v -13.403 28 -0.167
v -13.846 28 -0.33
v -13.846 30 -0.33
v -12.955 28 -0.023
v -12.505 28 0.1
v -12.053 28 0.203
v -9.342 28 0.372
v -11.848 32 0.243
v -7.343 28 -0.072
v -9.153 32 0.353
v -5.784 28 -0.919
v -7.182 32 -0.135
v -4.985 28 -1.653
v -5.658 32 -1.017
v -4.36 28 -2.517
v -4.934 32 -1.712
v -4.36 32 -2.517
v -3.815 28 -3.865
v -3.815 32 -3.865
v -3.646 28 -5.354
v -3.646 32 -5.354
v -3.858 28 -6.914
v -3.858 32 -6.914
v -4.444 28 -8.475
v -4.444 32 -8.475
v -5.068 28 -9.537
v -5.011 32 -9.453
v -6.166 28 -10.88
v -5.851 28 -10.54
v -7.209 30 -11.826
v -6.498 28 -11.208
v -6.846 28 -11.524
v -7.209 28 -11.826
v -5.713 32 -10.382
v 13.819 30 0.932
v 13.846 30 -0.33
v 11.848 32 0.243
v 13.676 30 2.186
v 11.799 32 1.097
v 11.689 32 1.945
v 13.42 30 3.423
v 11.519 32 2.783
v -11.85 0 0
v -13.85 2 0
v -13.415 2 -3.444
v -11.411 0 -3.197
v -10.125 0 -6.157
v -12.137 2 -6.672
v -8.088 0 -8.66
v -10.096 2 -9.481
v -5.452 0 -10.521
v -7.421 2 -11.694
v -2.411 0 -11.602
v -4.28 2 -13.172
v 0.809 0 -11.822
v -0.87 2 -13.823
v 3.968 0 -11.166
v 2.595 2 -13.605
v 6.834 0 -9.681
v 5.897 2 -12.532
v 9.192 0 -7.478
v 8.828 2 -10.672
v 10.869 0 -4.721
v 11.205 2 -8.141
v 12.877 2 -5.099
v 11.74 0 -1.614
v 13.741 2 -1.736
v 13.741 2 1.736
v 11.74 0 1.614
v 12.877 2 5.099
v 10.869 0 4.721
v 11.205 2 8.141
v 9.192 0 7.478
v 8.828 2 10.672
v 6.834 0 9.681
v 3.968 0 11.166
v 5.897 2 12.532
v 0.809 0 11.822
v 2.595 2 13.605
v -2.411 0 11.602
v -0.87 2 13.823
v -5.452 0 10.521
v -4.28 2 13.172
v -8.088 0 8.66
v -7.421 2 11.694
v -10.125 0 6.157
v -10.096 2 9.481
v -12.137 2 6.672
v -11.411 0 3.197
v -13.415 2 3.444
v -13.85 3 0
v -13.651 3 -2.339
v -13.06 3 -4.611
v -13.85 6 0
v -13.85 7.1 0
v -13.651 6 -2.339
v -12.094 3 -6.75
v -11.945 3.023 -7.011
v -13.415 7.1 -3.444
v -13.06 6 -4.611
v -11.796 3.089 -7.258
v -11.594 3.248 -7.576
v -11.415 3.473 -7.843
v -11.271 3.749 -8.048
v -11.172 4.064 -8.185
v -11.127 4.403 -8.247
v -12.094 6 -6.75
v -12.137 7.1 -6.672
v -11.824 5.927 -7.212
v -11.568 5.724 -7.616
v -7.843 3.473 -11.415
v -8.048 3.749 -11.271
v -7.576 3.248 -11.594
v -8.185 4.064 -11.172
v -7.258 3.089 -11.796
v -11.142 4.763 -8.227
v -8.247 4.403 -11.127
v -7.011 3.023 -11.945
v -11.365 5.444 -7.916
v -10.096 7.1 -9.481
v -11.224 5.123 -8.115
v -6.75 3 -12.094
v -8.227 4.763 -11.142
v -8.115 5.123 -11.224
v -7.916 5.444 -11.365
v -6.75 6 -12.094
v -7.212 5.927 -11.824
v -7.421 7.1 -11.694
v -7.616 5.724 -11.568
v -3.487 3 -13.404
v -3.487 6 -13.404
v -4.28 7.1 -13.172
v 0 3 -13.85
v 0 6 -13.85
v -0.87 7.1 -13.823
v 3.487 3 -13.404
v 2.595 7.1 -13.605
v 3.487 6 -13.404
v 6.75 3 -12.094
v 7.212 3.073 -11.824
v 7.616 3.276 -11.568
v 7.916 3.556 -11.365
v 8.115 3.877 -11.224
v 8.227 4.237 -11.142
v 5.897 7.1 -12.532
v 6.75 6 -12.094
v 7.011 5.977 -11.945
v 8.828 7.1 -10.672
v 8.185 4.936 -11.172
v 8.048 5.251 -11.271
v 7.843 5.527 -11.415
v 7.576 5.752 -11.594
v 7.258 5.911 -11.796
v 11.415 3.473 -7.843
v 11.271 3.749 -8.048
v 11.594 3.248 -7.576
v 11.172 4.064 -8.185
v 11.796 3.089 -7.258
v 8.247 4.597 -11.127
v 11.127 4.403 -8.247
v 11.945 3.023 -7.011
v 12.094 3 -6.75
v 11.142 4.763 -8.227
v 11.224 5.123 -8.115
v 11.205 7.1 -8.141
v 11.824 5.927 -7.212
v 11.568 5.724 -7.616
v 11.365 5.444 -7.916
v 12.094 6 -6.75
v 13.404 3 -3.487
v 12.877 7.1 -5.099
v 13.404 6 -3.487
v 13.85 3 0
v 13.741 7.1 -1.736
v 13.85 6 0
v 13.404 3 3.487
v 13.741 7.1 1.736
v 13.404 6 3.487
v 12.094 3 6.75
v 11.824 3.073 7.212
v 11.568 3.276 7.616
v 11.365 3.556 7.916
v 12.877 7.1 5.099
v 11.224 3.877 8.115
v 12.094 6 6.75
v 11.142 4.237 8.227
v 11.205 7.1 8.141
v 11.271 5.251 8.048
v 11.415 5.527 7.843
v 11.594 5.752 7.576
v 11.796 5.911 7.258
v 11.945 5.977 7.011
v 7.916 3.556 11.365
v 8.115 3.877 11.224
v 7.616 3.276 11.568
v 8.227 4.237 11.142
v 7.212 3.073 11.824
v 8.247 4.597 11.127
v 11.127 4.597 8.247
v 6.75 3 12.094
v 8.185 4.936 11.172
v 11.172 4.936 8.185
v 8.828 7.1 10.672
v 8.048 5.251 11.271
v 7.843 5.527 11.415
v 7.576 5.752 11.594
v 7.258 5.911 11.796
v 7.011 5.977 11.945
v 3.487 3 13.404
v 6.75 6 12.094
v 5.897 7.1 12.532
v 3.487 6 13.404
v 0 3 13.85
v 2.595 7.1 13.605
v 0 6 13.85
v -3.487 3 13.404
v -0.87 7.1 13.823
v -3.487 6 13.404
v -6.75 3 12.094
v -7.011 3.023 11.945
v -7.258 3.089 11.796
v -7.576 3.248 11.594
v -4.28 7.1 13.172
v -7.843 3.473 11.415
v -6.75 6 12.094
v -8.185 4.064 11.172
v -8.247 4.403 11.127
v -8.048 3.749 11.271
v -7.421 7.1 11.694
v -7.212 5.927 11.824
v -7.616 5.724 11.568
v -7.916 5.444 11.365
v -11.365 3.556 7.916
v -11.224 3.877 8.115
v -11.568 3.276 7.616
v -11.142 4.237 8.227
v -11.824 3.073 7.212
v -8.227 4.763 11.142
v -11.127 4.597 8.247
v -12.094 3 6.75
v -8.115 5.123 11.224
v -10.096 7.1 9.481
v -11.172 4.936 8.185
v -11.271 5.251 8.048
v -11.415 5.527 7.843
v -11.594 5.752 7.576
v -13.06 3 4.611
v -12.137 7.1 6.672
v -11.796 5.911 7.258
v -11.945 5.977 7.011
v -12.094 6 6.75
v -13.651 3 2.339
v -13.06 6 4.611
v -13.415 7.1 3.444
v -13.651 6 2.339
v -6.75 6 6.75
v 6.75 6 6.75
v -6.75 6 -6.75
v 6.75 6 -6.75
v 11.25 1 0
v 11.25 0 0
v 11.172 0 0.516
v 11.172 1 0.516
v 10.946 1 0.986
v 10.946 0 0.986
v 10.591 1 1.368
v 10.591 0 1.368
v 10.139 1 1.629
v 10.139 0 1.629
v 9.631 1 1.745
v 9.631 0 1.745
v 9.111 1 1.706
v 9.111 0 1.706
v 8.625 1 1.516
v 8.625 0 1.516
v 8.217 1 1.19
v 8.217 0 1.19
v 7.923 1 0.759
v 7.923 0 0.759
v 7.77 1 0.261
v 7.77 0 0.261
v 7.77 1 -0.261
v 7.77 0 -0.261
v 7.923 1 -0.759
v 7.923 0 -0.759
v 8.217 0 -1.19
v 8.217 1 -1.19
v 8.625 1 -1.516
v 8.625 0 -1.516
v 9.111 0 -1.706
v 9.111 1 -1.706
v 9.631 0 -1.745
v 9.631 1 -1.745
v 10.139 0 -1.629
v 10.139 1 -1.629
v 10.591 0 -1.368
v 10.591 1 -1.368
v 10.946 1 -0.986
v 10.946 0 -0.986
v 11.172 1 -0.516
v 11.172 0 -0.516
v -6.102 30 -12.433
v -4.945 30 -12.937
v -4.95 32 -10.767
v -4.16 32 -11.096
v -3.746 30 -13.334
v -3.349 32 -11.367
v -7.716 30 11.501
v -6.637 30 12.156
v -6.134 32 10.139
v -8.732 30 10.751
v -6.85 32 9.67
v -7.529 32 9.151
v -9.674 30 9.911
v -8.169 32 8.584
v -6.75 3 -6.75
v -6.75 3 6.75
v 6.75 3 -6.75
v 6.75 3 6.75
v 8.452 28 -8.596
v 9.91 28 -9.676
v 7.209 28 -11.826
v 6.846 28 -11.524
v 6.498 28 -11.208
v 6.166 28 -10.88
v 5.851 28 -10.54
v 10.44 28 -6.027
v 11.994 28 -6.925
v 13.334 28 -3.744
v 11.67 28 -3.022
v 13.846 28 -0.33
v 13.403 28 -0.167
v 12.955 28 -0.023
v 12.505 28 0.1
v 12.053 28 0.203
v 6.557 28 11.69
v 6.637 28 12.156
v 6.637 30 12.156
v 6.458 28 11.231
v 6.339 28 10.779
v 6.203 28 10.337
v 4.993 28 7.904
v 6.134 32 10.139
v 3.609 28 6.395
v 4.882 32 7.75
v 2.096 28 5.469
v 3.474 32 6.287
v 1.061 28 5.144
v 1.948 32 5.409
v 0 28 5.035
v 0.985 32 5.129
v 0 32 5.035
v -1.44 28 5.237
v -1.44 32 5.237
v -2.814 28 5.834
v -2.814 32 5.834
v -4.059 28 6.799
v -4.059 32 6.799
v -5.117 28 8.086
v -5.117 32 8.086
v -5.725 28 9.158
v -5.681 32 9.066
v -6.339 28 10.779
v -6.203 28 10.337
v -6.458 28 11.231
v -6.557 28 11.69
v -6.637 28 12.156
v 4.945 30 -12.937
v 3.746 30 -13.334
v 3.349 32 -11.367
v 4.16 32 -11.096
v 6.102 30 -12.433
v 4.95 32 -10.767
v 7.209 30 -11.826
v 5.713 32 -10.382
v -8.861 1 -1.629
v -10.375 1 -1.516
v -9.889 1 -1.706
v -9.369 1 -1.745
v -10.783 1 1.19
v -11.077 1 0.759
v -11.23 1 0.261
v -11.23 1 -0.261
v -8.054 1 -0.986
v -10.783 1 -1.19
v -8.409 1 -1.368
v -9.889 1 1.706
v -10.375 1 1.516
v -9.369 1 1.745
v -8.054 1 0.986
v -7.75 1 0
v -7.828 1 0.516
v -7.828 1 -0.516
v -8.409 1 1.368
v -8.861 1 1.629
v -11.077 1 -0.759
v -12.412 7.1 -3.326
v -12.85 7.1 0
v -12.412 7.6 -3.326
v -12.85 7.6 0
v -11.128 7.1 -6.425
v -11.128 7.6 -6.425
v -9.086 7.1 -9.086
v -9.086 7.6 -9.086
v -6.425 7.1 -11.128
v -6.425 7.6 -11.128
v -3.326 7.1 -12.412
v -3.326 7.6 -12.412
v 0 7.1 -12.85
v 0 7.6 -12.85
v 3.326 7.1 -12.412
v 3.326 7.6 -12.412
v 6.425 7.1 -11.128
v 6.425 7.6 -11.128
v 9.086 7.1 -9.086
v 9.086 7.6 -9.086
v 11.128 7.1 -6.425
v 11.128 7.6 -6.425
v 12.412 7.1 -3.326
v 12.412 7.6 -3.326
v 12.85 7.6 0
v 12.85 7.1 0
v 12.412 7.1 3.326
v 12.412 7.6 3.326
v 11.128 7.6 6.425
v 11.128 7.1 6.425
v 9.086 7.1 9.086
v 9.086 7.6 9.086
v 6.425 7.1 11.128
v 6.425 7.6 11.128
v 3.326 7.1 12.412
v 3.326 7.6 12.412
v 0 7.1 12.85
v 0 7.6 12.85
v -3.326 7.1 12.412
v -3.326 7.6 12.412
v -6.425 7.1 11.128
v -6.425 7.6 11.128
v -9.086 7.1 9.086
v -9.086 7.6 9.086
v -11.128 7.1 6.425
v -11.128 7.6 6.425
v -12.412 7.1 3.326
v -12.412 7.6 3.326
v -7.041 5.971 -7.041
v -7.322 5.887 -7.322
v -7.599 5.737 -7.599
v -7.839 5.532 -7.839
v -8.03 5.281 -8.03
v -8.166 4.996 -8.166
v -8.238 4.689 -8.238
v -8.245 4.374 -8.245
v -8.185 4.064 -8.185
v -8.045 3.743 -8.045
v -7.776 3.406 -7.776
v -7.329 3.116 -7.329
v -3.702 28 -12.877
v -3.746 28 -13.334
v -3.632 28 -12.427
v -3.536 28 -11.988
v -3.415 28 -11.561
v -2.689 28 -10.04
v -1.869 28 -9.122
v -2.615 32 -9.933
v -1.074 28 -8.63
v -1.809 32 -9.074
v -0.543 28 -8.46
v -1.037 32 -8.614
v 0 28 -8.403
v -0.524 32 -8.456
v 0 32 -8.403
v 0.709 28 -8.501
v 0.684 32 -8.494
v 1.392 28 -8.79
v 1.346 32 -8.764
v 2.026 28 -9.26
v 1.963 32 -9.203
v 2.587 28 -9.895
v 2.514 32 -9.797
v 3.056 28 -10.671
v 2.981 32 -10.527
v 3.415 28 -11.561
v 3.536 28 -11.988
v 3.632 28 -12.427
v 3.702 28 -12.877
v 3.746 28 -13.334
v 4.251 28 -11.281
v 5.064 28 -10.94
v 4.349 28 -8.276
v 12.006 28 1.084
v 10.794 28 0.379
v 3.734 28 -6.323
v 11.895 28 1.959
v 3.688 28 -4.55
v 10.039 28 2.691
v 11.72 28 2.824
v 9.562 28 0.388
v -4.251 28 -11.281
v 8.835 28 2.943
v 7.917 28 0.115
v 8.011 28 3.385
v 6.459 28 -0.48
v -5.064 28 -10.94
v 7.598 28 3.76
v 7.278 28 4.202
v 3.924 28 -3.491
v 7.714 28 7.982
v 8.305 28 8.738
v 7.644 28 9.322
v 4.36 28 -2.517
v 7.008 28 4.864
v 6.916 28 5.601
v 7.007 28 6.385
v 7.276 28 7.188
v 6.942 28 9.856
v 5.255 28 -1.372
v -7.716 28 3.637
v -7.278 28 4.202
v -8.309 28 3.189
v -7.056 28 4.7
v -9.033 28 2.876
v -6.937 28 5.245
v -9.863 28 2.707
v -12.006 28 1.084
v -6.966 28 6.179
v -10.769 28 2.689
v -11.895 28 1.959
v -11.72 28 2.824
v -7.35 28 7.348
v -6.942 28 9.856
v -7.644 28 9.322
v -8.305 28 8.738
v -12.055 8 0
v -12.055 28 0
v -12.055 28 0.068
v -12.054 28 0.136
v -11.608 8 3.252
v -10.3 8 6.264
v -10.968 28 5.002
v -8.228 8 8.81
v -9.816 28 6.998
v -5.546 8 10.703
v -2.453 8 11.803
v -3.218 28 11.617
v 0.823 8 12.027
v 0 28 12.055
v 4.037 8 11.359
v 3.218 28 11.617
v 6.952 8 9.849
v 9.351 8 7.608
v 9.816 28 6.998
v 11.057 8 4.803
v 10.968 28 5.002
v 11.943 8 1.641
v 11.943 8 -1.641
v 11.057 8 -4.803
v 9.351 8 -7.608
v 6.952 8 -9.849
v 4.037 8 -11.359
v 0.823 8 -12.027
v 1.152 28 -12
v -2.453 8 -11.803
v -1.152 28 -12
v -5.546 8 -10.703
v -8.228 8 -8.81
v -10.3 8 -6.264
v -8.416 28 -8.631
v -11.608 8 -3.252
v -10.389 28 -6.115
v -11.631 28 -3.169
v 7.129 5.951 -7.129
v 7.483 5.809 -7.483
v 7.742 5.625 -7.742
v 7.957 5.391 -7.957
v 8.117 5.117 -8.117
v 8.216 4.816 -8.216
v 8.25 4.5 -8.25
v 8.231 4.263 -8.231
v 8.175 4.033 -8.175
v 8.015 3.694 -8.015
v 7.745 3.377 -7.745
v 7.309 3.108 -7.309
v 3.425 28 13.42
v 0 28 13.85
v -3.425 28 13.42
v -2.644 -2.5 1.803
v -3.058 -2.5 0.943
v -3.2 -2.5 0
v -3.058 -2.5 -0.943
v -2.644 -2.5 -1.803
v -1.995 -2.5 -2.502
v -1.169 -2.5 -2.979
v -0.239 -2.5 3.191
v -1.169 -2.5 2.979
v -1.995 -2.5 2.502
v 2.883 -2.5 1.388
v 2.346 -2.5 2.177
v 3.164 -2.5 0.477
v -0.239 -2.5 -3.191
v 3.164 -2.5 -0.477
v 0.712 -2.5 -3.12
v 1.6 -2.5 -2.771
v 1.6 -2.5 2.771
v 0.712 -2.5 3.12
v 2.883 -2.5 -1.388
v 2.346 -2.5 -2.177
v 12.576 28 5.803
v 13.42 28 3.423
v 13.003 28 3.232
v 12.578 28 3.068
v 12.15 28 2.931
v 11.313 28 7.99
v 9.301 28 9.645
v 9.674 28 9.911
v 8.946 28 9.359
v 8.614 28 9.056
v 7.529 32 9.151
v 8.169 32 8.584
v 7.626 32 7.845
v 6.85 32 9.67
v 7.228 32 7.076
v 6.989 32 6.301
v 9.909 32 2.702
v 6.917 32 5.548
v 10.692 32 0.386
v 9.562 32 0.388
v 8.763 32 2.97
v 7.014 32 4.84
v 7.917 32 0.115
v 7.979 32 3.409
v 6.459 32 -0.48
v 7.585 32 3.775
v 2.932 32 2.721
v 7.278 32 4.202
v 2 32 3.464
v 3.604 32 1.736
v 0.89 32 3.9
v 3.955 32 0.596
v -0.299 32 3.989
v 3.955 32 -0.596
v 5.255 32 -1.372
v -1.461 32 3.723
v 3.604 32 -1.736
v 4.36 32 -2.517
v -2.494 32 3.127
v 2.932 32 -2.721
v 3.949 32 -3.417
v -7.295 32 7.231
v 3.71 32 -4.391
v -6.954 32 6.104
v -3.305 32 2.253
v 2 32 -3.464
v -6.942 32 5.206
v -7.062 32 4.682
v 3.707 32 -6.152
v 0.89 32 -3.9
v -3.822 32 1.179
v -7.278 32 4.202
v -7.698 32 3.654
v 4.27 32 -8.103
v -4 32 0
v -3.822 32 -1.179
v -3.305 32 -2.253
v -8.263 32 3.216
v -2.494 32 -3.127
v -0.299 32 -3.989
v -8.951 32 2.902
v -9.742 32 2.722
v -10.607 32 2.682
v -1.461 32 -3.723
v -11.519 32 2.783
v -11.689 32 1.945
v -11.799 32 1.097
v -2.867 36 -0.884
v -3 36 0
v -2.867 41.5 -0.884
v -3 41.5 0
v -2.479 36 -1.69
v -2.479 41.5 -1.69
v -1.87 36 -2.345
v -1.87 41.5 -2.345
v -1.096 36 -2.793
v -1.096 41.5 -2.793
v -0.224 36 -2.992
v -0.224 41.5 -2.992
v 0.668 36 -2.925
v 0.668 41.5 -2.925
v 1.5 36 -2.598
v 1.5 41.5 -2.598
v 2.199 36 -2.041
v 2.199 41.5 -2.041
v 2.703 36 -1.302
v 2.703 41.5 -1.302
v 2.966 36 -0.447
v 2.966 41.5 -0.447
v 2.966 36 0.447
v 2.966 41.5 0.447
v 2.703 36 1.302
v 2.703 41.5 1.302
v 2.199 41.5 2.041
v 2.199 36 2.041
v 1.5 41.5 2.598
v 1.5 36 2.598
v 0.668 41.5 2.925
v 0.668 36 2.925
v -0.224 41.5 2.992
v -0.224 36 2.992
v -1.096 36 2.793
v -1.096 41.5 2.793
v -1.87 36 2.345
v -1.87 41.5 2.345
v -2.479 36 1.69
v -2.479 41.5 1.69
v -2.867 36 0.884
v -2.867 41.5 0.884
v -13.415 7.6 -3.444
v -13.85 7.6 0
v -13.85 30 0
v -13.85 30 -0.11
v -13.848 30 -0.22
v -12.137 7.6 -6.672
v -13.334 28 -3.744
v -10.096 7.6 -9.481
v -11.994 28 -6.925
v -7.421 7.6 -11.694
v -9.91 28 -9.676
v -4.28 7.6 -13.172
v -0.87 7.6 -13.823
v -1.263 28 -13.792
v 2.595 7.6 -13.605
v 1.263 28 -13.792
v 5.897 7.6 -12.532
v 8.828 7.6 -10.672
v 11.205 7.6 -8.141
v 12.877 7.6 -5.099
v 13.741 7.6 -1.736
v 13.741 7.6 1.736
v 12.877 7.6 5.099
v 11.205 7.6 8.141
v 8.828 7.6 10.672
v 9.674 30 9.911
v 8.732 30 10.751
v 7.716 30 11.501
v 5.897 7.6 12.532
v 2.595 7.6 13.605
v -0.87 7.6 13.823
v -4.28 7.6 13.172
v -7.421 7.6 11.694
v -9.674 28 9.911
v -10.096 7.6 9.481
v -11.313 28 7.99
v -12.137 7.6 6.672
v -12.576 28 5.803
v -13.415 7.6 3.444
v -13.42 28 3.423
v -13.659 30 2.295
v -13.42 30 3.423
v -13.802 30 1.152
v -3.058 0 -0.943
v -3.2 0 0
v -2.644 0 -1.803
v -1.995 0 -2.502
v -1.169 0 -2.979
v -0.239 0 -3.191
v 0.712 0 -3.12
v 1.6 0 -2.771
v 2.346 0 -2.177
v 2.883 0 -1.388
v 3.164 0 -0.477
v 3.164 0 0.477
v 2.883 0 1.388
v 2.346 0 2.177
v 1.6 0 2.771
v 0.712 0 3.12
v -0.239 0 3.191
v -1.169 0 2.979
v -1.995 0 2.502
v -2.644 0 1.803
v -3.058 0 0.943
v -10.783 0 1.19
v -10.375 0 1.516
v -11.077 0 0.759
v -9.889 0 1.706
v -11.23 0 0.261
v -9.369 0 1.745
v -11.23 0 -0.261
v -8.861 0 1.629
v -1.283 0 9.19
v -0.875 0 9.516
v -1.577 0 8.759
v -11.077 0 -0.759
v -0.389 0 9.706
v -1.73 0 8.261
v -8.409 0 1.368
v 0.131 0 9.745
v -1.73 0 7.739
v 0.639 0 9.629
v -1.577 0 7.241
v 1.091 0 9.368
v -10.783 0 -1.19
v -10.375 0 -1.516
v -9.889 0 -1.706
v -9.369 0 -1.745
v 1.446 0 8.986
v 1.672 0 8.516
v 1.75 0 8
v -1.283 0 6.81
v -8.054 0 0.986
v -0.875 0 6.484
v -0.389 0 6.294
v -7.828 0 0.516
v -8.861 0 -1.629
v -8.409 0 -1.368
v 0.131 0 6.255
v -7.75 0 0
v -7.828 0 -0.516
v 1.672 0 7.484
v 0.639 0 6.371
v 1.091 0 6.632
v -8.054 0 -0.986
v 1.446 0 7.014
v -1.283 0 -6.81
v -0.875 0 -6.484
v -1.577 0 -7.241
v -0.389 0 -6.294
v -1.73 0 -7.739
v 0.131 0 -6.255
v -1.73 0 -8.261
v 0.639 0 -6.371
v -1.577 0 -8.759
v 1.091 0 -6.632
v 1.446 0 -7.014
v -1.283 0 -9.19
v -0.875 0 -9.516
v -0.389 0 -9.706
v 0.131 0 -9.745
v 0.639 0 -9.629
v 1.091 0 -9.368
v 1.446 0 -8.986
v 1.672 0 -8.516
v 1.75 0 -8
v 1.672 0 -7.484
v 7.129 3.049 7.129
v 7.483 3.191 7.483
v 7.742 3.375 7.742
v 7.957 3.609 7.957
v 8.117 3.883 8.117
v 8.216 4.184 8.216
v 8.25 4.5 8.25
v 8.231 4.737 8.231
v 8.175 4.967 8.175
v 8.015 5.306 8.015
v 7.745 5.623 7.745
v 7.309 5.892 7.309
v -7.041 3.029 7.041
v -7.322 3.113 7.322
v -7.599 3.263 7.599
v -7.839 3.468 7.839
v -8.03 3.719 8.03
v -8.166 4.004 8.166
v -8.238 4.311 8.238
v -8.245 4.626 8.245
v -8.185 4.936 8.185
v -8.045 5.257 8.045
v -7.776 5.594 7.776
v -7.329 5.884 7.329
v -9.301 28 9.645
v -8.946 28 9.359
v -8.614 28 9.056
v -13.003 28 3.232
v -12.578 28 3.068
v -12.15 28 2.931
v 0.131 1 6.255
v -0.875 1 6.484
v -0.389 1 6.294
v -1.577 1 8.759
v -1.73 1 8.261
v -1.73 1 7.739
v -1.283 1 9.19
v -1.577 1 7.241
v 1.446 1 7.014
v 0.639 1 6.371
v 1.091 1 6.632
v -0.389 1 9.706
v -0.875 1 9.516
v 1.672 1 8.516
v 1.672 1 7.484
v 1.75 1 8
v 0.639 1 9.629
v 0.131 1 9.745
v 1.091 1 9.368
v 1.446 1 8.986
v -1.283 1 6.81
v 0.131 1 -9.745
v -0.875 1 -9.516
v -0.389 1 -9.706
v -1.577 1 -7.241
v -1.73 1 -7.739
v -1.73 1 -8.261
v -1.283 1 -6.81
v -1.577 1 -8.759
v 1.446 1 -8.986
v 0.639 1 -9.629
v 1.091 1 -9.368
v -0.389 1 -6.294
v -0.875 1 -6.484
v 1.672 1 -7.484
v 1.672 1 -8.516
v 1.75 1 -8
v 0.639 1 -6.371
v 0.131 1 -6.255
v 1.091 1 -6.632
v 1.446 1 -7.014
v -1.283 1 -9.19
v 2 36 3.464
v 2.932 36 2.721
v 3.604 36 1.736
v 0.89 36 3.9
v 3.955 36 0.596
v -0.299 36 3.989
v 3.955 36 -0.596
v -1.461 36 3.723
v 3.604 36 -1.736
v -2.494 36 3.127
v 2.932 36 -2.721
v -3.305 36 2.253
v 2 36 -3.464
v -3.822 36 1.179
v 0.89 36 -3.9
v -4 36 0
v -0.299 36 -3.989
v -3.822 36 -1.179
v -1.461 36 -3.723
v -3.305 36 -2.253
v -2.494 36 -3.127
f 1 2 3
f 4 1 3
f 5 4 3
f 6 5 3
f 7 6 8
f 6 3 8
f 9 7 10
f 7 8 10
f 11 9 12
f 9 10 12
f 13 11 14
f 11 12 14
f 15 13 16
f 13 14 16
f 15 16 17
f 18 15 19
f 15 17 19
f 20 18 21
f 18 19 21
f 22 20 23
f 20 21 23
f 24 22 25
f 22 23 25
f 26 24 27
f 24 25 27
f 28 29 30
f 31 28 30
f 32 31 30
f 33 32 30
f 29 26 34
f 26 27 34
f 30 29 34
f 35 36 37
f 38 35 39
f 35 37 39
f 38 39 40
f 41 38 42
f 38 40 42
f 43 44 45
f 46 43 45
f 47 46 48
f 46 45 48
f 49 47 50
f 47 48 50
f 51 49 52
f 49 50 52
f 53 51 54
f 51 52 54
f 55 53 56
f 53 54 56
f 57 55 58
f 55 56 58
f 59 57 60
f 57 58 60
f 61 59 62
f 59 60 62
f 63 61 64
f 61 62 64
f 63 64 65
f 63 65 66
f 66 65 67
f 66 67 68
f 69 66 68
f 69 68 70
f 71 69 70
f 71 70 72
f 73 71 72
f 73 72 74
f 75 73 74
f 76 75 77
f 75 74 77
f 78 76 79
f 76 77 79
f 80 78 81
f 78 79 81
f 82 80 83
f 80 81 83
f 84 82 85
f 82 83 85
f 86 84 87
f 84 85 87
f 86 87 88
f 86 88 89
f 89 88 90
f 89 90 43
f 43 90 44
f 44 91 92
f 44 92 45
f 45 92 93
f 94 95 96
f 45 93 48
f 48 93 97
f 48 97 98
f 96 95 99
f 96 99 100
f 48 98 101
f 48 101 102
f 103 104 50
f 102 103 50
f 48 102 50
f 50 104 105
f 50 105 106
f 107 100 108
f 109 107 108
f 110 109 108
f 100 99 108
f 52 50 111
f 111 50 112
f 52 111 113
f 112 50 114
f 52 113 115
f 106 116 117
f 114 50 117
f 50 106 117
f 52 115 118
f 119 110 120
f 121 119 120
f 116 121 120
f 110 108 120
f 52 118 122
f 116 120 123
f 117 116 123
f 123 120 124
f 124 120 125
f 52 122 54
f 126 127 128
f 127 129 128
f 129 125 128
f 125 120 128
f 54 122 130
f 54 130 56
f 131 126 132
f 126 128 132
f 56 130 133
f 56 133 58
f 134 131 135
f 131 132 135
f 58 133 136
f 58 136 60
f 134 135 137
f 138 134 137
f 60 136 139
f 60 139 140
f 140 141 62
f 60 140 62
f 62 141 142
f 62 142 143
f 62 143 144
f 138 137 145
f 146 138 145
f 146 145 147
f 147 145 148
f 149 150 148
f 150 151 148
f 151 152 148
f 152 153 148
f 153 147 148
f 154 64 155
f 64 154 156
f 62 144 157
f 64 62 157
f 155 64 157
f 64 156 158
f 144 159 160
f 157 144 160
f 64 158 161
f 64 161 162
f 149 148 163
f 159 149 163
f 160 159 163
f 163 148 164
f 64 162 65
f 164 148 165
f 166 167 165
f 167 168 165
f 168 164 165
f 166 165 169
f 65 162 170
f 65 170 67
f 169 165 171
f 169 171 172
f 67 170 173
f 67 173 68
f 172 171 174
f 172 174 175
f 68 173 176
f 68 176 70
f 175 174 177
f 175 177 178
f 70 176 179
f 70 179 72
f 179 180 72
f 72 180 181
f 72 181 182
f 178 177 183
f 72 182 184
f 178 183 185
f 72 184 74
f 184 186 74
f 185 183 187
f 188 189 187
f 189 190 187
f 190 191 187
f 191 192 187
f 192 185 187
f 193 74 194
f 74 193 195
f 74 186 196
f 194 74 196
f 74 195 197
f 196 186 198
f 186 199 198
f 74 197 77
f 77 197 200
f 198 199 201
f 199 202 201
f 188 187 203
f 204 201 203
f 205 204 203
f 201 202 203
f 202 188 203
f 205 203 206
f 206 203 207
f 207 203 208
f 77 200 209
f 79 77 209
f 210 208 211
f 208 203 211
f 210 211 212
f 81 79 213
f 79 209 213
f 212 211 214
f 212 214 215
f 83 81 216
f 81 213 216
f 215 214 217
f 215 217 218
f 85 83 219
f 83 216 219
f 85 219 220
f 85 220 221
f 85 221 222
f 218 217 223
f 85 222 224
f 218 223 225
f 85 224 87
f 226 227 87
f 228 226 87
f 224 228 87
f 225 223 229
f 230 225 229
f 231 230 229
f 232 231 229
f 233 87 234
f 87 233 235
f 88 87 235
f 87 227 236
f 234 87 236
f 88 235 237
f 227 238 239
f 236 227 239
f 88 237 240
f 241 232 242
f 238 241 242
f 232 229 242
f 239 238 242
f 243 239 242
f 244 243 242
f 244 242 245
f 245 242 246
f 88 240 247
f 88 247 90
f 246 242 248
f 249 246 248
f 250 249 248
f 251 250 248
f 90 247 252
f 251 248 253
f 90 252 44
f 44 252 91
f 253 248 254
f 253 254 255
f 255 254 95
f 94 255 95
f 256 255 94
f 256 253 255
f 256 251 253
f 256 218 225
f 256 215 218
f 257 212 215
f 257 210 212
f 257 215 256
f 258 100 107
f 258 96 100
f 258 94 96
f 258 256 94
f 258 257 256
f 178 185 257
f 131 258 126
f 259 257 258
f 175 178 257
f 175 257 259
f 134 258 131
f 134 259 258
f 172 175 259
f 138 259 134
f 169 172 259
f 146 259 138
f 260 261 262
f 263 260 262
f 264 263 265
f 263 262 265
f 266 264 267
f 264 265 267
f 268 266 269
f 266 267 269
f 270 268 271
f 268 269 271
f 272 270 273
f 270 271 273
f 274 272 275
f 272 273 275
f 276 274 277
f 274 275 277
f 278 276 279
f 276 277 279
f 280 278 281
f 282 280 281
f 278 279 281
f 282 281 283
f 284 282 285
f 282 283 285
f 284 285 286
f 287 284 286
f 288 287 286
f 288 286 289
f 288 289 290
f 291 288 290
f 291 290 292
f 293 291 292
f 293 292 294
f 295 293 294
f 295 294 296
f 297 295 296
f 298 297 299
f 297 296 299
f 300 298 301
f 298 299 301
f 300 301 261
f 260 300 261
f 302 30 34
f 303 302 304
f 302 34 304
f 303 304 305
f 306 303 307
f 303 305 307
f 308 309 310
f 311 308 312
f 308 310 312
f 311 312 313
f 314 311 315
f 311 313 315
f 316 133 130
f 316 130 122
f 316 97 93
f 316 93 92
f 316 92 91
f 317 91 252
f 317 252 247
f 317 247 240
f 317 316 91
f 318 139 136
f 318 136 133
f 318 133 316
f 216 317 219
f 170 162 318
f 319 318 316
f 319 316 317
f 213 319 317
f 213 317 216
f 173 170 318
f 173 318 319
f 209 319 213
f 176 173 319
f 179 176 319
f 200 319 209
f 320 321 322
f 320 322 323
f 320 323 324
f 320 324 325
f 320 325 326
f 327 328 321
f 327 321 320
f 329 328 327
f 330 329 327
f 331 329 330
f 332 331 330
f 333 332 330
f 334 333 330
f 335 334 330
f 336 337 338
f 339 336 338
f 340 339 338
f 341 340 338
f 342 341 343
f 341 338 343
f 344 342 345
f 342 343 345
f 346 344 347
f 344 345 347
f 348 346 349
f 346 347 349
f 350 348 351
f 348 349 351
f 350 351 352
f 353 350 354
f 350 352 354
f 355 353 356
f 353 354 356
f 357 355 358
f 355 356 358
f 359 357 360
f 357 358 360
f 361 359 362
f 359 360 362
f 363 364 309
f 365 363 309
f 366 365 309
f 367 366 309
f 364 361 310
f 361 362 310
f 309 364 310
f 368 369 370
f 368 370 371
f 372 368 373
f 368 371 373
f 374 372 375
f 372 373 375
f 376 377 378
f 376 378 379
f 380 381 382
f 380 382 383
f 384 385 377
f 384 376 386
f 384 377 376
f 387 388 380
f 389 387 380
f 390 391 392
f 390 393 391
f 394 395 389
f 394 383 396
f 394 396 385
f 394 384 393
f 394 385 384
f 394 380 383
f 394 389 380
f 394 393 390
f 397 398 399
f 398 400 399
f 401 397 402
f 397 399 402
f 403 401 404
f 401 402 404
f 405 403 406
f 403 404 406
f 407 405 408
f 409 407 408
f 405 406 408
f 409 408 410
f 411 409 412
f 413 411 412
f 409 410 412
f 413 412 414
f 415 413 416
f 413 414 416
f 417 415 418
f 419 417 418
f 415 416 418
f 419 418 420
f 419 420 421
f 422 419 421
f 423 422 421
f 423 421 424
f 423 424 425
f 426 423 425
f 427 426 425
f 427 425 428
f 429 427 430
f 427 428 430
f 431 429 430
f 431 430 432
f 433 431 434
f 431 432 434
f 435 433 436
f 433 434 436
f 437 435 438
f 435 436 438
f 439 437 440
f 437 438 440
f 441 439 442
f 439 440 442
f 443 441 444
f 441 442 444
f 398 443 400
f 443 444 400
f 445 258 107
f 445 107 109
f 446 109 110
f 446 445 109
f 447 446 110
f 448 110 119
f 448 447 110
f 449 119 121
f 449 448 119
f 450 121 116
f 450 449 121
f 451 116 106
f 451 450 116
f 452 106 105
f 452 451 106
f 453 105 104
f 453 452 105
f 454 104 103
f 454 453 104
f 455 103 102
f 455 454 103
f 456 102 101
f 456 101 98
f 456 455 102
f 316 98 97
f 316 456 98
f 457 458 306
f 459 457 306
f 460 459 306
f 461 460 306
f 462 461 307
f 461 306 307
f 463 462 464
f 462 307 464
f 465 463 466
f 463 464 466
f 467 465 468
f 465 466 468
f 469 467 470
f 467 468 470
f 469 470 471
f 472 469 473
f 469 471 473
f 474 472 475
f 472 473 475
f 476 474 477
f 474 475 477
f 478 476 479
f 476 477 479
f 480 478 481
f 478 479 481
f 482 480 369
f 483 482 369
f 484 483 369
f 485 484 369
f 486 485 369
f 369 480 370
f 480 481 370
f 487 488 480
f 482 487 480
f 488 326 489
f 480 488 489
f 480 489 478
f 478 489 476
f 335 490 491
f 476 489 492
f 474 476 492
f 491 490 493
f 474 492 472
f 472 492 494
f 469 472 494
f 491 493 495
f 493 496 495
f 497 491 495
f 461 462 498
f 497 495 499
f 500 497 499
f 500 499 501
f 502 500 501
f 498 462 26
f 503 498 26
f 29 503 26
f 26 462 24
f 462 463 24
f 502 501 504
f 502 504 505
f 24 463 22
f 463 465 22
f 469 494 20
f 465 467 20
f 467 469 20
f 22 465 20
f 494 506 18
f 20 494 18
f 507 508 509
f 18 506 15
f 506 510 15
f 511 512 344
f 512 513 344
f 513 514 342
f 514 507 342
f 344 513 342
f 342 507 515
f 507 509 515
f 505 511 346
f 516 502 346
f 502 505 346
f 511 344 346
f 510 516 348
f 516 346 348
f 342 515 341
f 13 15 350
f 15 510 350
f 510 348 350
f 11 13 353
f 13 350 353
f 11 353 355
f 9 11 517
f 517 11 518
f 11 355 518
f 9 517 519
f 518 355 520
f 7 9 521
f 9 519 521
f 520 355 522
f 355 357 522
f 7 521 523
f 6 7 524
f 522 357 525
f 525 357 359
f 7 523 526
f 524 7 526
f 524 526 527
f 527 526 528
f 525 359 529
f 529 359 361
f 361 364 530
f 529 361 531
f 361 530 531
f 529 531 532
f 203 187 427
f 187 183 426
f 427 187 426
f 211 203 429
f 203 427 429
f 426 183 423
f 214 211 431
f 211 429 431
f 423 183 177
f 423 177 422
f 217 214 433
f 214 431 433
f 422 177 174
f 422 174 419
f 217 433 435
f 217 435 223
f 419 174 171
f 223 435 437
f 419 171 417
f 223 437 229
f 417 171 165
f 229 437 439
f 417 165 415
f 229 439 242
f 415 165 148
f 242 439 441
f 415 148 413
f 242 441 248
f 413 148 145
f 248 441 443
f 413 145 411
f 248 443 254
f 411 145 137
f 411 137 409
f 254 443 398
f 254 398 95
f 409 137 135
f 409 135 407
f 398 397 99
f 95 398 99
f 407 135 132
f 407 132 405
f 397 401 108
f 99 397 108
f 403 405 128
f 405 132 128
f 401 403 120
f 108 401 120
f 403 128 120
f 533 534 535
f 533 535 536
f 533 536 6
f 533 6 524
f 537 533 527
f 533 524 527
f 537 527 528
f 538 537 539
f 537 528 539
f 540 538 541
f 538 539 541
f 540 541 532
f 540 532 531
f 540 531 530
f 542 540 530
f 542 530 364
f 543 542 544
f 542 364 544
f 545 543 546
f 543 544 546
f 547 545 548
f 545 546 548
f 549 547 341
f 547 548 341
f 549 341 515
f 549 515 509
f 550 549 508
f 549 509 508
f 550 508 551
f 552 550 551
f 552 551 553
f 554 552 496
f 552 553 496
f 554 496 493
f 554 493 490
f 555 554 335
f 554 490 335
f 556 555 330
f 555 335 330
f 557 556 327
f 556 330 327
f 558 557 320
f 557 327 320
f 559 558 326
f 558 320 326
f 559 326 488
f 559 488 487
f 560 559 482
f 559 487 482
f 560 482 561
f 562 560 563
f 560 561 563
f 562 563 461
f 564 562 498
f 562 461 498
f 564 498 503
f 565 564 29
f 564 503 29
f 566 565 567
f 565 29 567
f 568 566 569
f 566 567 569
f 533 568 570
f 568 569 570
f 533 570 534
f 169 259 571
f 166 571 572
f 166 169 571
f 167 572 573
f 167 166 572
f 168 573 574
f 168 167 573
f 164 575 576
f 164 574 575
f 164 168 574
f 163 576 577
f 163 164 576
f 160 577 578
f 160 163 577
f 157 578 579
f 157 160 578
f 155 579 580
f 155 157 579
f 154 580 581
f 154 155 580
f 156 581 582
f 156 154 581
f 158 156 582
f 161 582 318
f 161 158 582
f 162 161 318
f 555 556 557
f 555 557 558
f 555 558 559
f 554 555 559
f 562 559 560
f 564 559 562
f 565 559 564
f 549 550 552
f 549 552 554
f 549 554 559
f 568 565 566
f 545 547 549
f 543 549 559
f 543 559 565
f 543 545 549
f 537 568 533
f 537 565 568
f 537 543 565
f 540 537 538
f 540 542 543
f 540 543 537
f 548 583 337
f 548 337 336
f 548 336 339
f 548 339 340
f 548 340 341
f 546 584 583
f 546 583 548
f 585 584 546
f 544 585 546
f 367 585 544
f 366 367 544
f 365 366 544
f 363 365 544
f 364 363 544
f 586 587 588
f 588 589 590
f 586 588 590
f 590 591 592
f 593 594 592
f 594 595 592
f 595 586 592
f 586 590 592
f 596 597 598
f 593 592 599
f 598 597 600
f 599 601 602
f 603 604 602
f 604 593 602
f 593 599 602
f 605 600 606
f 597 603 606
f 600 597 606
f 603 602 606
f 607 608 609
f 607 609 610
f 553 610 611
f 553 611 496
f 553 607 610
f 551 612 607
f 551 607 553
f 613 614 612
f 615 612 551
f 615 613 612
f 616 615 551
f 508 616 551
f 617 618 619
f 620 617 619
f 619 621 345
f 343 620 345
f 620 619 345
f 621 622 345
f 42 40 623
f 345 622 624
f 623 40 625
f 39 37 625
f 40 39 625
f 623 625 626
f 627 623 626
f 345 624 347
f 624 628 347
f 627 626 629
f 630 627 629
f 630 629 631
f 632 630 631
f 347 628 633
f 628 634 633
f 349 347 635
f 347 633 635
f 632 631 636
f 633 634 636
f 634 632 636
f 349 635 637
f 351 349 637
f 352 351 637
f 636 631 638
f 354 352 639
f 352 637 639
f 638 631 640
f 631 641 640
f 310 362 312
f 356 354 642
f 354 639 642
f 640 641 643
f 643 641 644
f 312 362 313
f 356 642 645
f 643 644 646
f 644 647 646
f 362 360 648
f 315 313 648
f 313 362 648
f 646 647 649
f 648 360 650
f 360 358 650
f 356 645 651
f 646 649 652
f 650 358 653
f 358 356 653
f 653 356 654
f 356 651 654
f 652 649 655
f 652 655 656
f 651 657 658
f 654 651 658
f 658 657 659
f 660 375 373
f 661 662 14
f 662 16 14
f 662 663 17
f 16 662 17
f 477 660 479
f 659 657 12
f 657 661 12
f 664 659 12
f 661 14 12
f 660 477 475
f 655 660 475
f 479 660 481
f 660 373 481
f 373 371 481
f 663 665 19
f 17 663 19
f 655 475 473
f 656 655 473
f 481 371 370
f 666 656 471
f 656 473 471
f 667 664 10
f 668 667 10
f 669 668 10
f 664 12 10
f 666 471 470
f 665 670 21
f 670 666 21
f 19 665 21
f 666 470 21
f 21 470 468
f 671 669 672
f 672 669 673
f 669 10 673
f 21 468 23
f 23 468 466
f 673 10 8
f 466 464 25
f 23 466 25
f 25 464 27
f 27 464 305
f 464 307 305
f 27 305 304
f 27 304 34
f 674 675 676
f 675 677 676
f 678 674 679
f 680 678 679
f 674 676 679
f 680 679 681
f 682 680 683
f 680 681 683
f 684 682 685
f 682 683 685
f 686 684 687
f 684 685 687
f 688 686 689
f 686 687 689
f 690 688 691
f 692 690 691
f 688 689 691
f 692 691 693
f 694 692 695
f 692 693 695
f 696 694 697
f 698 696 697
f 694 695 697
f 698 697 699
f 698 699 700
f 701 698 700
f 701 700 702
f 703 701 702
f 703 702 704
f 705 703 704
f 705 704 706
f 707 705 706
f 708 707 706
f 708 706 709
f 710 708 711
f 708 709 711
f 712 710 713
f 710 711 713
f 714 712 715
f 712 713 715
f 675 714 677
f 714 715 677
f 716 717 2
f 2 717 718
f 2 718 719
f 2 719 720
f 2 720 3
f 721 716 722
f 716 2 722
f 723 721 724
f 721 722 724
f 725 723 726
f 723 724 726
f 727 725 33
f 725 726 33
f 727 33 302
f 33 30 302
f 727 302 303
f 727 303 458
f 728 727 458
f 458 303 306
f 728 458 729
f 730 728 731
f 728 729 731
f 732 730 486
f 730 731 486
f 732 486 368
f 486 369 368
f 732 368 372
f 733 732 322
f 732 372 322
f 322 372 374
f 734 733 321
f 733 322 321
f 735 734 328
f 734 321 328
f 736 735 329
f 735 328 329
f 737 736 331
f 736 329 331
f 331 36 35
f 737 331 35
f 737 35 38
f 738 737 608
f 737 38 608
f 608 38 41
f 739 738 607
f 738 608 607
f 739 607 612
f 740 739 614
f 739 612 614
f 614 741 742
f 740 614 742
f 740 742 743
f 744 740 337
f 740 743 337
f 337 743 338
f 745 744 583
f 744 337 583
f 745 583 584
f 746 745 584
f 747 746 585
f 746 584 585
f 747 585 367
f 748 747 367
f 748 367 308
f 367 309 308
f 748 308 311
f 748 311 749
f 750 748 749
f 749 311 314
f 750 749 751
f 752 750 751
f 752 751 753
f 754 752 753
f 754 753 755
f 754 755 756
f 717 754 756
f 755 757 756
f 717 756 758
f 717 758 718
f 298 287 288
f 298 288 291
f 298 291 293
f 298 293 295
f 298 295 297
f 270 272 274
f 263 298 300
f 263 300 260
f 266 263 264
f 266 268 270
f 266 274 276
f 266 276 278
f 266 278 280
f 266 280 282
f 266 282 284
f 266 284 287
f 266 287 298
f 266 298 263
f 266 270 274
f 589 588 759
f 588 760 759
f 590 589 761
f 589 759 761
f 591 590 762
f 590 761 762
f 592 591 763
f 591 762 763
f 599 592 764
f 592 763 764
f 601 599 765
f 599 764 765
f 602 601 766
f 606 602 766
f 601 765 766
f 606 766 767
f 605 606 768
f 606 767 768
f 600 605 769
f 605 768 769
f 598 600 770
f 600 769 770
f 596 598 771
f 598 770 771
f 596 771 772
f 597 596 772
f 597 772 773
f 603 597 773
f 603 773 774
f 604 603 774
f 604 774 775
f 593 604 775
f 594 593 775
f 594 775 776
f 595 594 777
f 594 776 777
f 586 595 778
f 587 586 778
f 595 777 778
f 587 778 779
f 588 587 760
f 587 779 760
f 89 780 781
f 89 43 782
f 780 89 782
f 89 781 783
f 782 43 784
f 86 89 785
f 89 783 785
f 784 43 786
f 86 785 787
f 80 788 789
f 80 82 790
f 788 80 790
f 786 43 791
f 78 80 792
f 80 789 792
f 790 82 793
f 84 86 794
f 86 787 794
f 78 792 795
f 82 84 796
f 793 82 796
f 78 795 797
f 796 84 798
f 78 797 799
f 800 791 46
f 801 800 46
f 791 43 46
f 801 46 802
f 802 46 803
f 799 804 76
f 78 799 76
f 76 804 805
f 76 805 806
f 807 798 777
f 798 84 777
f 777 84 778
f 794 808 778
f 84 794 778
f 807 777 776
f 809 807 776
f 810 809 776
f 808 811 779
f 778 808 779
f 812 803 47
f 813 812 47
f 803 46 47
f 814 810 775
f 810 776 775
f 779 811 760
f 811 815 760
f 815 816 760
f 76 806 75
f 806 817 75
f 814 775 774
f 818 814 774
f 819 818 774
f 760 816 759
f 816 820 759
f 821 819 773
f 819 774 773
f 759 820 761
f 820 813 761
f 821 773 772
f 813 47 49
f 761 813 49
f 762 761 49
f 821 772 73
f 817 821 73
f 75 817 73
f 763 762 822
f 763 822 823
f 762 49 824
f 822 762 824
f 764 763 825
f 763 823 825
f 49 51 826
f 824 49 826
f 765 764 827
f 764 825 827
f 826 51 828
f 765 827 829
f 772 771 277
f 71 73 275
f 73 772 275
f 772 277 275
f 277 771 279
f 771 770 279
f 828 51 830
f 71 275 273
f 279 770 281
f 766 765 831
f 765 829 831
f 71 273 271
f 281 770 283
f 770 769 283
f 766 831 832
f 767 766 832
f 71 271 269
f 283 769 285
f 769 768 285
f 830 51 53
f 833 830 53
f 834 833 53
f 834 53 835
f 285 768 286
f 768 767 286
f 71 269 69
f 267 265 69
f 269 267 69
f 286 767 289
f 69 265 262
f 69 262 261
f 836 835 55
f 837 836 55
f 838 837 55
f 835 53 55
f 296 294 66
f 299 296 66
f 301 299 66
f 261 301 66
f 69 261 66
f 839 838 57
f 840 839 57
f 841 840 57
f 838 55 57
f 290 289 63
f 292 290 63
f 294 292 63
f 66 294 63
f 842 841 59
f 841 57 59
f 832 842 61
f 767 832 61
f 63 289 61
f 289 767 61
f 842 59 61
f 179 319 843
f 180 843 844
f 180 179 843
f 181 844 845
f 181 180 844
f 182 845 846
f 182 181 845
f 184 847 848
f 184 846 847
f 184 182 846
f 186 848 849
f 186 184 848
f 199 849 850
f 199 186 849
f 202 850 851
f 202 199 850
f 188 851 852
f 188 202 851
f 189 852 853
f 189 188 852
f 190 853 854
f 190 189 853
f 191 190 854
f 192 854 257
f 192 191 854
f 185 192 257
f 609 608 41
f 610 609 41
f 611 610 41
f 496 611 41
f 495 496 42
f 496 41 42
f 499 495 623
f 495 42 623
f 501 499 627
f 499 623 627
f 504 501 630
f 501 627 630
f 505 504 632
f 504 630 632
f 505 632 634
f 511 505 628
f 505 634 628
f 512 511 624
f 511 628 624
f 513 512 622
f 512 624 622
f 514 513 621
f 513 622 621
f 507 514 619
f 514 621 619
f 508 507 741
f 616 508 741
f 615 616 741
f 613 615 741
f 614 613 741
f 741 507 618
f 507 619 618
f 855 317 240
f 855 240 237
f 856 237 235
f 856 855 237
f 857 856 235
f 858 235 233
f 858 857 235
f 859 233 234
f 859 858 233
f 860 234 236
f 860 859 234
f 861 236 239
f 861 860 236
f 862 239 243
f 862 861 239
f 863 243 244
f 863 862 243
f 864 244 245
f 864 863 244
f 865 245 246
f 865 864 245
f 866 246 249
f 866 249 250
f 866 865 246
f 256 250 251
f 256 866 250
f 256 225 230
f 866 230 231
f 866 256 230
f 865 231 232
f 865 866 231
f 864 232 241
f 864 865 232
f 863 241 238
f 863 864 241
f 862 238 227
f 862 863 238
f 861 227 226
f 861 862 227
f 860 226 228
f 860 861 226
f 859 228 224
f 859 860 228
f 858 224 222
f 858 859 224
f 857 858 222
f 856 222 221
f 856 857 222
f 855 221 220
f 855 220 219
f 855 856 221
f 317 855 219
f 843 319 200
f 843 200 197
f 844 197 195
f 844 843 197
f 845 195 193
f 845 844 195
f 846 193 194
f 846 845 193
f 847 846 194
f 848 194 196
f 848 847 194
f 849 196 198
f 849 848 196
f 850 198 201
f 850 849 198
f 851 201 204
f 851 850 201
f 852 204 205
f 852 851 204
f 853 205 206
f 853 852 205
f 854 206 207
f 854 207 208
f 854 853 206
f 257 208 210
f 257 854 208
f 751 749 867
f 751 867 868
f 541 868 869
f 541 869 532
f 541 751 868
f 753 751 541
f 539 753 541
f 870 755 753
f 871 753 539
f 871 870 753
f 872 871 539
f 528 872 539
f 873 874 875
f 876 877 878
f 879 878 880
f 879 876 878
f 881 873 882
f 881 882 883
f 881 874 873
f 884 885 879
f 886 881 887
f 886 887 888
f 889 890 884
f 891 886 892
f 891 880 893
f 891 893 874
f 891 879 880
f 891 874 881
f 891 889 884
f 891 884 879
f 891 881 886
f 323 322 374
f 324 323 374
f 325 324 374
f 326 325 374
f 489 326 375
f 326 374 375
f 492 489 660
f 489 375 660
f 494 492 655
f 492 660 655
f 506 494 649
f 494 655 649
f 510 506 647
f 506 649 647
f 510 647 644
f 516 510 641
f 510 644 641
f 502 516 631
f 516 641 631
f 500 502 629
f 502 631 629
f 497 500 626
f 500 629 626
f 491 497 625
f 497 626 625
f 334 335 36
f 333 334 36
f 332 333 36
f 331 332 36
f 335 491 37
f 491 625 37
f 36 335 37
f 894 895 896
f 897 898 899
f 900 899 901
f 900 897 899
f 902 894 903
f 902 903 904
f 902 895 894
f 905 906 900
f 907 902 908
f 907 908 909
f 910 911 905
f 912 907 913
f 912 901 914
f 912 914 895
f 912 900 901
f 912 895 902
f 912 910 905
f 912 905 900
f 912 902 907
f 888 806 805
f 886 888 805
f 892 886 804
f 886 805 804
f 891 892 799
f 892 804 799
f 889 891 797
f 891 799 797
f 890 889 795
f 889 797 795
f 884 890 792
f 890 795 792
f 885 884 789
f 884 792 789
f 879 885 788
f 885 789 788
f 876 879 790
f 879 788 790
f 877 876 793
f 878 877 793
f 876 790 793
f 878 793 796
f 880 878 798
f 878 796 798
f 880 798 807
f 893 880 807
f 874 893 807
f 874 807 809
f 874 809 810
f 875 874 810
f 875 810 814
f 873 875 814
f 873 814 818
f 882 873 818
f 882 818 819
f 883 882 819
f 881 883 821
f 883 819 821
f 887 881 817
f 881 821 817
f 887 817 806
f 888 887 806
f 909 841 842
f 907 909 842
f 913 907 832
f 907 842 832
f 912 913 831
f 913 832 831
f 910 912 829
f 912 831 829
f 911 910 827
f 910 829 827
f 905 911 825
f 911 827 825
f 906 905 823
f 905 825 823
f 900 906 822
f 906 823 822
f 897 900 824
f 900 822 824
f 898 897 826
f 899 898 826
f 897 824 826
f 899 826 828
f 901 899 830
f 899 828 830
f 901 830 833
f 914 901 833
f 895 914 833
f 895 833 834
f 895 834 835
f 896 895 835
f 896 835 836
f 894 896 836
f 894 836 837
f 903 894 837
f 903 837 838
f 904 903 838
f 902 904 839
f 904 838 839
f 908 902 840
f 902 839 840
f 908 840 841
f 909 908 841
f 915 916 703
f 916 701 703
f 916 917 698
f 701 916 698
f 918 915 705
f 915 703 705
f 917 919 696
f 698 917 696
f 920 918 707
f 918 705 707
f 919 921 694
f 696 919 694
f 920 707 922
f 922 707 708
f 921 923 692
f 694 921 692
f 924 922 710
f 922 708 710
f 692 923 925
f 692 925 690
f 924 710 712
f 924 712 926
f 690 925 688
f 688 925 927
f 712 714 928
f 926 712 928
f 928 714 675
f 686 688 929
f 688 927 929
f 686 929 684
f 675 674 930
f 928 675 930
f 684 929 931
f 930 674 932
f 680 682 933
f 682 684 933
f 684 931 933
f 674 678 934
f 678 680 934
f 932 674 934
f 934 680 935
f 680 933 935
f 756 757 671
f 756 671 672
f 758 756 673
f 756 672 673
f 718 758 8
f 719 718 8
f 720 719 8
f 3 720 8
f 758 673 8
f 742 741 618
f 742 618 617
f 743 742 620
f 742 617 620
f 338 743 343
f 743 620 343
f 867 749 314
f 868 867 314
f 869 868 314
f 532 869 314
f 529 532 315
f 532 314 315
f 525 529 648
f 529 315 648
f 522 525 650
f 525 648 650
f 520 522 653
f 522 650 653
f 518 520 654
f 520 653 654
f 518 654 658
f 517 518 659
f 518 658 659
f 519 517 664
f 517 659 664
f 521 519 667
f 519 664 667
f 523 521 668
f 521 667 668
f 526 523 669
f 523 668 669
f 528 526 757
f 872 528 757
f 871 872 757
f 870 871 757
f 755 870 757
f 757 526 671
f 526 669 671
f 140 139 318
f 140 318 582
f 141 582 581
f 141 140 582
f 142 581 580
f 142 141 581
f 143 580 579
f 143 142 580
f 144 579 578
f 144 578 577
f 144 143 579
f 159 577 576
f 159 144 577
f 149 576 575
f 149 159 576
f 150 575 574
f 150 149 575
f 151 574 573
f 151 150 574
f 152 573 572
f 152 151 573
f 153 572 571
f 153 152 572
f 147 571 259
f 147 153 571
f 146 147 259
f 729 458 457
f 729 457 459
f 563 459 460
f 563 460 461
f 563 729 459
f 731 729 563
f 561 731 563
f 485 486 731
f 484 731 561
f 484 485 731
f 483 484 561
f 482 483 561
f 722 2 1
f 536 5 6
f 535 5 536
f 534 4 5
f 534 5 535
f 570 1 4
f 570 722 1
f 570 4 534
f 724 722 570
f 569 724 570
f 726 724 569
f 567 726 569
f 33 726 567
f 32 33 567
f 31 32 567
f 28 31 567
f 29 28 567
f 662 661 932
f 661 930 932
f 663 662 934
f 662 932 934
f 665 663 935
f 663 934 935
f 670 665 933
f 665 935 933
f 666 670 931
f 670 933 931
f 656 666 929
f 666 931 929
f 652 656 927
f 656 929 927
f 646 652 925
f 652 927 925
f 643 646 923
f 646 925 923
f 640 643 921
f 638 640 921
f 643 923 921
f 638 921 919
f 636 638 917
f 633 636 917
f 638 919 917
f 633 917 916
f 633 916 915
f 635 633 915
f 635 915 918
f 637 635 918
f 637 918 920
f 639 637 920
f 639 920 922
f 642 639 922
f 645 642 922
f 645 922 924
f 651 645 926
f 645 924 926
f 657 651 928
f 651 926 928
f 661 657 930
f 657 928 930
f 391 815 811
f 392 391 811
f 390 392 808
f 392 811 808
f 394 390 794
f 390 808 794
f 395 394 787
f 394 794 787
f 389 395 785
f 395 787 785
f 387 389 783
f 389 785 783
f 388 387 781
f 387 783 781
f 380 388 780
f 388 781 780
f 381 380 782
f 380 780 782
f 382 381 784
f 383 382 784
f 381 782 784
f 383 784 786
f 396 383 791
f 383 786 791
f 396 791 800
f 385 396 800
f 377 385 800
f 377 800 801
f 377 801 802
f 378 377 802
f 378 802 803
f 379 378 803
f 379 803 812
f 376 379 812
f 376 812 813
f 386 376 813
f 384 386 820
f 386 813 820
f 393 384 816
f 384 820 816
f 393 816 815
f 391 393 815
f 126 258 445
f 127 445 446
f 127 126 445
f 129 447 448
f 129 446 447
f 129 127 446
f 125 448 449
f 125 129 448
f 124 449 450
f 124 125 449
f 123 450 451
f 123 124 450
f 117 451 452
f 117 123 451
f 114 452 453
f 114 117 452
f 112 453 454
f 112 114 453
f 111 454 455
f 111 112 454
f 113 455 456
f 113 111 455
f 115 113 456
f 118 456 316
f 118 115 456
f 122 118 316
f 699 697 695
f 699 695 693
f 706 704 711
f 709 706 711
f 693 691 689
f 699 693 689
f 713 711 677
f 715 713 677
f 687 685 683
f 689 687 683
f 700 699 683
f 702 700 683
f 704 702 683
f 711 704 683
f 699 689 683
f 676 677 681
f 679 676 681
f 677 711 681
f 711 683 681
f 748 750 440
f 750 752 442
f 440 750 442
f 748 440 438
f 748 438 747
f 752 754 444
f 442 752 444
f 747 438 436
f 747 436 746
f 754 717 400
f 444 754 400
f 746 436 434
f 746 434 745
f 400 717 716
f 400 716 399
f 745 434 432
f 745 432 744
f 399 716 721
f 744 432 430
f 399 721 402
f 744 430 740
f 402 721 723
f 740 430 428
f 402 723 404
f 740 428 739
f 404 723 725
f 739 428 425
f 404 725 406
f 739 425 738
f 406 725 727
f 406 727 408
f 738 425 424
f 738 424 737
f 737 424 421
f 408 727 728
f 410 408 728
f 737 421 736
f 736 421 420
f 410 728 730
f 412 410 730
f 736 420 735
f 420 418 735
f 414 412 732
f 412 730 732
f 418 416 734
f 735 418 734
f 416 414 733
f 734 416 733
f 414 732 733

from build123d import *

# Parameters (mm, degrees)
CHAMFER1_SIZE      = 2
SKETCH2_RX         = 8.815168497
SKETCH2_RY         = 6.763008786
SKETCH2_RX_2       = 5.446652698
SKETCH2_RY_2       = 3.762863515
CUT_EXTRUDE1_DEPTH = 4
CIRPATTERN1_COUNT  = 3
SKETCH3_R          = 12.054961978
CUT_EXTRUDE2_DEPTH = 20
CUT_EXTRUDE3_DEPTH = 46.890031658
CIRPATTERN3_COUNT  = 2
CIRPATTERN3_ANGLE  = 90
SKETCH5_R          = 1.75
CUT_EXTRUDE4_DEPTH = 1


with BuildPart() as part:
    # Sketch1 → Revolve1 (revolve)
    with BuildSketch(Plane.XY):
        Polygon((-3.2, 0), (-13.85, 0), (-13.85, 7.1), (-12.85, 7.1), (-12.85, 7.6), (-13.85, 7.6), (-13.85, 32), (-4, 32), (-4, 36), (-3, 36), (-3, 41.5), (0, 41.5), (0, -2.5), (-3.2, -2.5), align=None)
    revolve(axis=Axis((0, 41.5, 0), (0, -1, 0)))

    # Chamfer1
    chamfer1_edges = [part.edges().sort_by_distance(p)[0] for p in [
        (13.85, 0, 0),
        (13.85, 32, 0),
    ]]
    chamfer(chamfer1_edges, length=CHAMFER1_SIZE)

    # Sketch2 → Cut-Extrude1 (cut)
    with BuildSketch(Plane(origin=(0, 32, 0), x_dir=(1, 0, 0), z_dir=(0, 1, 0))):
        with Locations(Location((0, -13.85), (0, 0, 90))):
            Ellipse(SKETCH2_RX, SKETCH2_RY)
        with Locations(Location((0, 13.85), (0, 0, -90))):
            Ellipse(SKETCH2_RX_2, SKETCH2_RY_2)
        with Locations(Location((-77.957366116, 6.373706544), (0, 0, 90))):
            Ellipse(SKETCH2_RX, SKETCH2_RY)
        with Locations(Location((-77.957366116, 34.073706544), (0, 0, 90))):
            Ellipse(SKETCH2_RX_2, SKETCH2_RY_2)
    cut_extrude1 = extrude(amount=-CUT_EXTRUDE1_DEPTH, mode=Mode.SUBTRACT)

    # CirPattern1: Cut-Extrude1 ×3 about axis
    cirpattern1_axis = Axis((0, 41.5, 0), (0, 1, 0))
    for i in range(1, CIRPATTERN1_COUNT):
        add(cut_extrude1.rotate(cirpattern1_axis, i * 360 / CIRPATTERN1_COUNT), mode=Mode.SUBTRACT)

    # Sketch3 → Cut-Extrude2 (cut)
    with BuildSketch(Plane(origin=(0, 28, 0), x_dir=(1, 0, 0), z_dir=(0, 1, 0))):
        with Locations(Location((0, 0, 0), (0, 0, 180))):
            Circle(SKETCH3_R)
    extrude(amount=-CUT_EXTRUDE2_DEPTH, mode=Mode.SUBTRACT)

    # Sketch4 → Cut-Extrude3 (cut, symmetric)
    with BuildSketch(Plane(origin=(0, 0, 0), x_dir=(0, 0, -1), z_dir=(1, 0, 0))):
        with BuildLine():
            Line((-6.75, 6), (6.75, 6))
            ThreePointArc((6.75, 6), (8.25, 4.5), (6.75, 3))
            Line((6.75, 3), (-6.75, 3))
            ThreePointArc((-6.75, 3), (-8.25, 4.5), (-6.75, 6))
        make_face()
    cut_extrude3 = extrude(amount=CUT_EXTRUDE3_DEPTH, both=True, mode=Mode.SUBTRACT)

    # CirPattern3: Cut-Extrude3 ×2 about axis
    cirpattern3_axis = Axis((0, 41.5, 0), (0, 1, 0))
    for i in range(1, CIRPATTERN3_COUNT):
        add(cut_extrude3.rotate(cirpattern3_axis, i * CIRPATTERN3_ANGLE / (CIRPATTERN3_COUNT - 1)), mode=Mode.SUBTRACT)

    # Sketch5 → Cut-Extrude4 (cut)
    with BuildSketch(Plane.XZ):
        with Locations((-9.5, 0)):
            Circle(SKETCH5_R)
        with Locations((0, 8)):
            Circle(SKETCH5_R)
        with Locations((9.5, 0)):
            Circle(SKETCH5_R)
        with Locations((0, -8)):
            Circle(SKETCH5_R)
    extrude(amount=-CUT_EXTRUDE4_DEPTH, mode=Mode.SUBTRACT)


solid = part.part
